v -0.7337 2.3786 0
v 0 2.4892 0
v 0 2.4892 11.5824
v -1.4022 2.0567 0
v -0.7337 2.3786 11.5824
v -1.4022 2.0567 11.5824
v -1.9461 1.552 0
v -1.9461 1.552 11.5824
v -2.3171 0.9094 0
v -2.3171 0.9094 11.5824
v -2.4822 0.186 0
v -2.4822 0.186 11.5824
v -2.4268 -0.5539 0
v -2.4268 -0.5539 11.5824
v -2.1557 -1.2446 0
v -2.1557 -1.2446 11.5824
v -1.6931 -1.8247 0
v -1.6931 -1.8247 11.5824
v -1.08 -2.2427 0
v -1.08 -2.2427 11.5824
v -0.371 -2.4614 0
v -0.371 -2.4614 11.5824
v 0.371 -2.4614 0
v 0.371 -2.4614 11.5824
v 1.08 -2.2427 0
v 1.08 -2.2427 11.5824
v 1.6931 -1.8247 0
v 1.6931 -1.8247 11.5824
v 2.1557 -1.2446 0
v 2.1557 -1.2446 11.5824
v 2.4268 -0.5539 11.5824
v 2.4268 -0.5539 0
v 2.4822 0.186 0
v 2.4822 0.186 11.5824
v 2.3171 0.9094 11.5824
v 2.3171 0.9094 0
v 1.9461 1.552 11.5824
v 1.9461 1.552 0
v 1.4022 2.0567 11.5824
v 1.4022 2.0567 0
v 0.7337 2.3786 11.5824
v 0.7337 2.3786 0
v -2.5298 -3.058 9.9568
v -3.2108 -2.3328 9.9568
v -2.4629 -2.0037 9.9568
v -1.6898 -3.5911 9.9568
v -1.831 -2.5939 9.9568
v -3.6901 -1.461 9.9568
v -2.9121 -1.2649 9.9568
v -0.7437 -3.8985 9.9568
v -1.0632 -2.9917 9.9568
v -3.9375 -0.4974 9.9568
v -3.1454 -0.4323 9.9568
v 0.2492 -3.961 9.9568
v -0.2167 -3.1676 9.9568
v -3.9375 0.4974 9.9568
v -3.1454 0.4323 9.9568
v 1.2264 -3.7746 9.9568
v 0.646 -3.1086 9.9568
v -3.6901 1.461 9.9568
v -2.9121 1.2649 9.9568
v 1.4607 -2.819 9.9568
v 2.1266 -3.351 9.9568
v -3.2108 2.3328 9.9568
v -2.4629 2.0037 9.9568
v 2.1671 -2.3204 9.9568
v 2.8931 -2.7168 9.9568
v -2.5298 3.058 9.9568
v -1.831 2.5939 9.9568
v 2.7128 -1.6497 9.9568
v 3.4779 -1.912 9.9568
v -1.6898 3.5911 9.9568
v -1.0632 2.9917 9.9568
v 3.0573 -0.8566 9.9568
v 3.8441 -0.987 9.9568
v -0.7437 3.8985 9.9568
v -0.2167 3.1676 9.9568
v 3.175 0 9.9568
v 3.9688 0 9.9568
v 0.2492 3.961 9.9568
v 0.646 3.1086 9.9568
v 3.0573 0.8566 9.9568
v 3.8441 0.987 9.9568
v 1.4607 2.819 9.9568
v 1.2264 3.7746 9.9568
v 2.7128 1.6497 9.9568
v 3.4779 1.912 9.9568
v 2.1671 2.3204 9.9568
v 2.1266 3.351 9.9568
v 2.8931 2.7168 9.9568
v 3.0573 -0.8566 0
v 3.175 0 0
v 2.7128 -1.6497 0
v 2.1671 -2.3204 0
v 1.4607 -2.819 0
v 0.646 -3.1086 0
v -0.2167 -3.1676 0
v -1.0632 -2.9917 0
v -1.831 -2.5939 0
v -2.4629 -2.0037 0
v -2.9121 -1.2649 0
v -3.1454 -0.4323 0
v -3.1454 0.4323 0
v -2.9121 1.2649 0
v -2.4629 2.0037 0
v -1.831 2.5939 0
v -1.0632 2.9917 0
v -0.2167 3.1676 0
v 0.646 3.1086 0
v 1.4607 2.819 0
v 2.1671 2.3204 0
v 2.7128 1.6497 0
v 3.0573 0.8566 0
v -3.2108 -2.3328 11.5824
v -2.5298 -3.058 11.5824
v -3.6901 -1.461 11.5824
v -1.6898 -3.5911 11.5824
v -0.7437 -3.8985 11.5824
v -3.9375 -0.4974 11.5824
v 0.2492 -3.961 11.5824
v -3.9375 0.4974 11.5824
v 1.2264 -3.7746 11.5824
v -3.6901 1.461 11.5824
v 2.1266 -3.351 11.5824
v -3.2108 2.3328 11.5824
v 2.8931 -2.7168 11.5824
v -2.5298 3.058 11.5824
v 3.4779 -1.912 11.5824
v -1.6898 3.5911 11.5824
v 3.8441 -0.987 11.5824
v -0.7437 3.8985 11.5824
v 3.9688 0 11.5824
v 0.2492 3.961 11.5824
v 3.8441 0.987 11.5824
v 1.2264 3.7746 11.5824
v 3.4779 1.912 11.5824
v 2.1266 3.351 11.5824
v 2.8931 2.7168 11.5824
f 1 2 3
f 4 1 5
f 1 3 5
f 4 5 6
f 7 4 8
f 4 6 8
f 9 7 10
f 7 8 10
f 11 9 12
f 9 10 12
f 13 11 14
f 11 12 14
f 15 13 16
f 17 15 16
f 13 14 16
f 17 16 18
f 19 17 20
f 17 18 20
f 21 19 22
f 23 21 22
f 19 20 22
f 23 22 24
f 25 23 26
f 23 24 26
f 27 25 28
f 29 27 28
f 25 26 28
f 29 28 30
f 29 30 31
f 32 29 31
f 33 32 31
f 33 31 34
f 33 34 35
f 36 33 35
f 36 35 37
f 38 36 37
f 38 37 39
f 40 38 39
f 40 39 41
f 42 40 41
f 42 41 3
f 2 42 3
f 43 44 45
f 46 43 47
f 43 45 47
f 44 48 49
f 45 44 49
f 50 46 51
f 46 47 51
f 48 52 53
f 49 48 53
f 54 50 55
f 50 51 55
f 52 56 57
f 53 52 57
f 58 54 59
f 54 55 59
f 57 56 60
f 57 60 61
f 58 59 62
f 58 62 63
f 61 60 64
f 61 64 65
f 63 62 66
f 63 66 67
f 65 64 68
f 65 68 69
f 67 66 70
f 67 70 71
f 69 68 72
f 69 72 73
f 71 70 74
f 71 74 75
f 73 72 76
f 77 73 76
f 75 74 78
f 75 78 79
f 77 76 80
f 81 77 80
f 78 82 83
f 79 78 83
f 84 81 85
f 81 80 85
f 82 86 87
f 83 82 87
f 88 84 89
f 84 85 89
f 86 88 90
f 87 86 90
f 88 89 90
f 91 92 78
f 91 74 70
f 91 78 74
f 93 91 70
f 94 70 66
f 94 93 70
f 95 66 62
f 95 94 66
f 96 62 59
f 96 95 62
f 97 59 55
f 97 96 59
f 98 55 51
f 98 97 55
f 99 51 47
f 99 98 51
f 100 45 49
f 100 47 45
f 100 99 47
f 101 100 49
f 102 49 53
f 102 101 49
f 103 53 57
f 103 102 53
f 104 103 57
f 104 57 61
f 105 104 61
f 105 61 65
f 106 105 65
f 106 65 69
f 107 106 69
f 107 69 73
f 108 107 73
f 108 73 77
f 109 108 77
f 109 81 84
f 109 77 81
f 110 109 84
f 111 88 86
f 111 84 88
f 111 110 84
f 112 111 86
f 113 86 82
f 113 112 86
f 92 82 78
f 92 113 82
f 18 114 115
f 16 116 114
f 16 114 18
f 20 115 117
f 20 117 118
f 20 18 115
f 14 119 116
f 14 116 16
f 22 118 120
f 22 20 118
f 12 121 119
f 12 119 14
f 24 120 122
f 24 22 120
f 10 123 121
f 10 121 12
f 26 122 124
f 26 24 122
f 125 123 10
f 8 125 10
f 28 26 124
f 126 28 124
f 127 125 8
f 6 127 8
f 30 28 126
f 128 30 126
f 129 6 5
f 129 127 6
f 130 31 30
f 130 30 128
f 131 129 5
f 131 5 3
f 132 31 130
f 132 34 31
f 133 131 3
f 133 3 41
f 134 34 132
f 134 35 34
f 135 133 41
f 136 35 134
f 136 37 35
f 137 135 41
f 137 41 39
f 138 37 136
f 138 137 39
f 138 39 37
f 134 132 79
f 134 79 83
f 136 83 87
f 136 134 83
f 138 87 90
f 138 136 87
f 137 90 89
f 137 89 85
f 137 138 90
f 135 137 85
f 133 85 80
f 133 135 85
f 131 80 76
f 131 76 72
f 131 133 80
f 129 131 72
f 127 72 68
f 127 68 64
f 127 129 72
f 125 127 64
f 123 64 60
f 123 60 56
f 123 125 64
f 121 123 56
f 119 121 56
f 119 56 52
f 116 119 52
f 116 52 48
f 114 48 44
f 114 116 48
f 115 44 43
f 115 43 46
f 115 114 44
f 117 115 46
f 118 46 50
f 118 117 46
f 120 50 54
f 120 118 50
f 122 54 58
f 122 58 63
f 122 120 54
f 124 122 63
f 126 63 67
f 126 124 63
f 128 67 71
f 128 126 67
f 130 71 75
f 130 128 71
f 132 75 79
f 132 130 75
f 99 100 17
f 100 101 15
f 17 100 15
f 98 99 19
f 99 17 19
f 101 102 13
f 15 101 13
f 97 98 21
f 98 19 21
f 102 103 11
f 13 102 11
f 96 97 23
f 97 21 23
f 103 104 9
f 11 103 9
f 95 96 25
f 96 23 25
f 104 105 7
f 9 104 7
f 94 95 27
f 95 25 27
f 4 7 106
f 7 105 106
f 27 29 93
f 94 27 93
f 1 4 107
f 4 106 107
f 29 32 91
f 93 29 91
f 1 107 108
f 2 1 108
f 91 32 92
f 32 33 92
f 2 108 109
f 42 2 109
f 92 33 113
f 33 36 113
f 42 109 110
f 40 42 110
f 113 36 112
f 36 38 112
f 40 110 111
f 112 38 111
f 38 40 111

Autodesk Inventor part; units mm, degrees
ref_plane "YZ Plane" through (0, 0, 0) normal (1, 0, 0) x (0, 1, 0)
ref_plane "XZ Plane" through (0, 0, 0) normal (0, 1, 0) x (-1, 0, 0)
ref_plane "XY Plane" through (0, 0, 0) normal (0, 0, 1) x (1, 0, 0)
sketch "Sketch1" plane through (0, 0, 0) normal (0, 0, 1) x (1, 0, 0)
  circle A0 centre (0, 0) radius 3.175
  dimension "d0" = 6.35
extrude "Extrusion1" add sketch "Sketch1" along normal blind 11.5824
hole "Hole1" at (0, 0, 0) direction (0, 0, 1) diameter 4.9784 end through all clearance for "Socket Head Cap Screw" size "#10" standard "Ansi Unified Screw Threads"
sketch "Sketch2" plane through (0, 0, 11.5824) normal (0, 0, 1) x (1, 0, 0)
  circle A0 centre (0, 0) radius 3.175 projected
  circle A1 centre (0, 0) radius 3.9688
  dimension "d10" = 7.9375
extrude "Extrusion2" add sketch "Sketch2" against normal blind 1.6256
properties part number "Tensioning Shaft"
